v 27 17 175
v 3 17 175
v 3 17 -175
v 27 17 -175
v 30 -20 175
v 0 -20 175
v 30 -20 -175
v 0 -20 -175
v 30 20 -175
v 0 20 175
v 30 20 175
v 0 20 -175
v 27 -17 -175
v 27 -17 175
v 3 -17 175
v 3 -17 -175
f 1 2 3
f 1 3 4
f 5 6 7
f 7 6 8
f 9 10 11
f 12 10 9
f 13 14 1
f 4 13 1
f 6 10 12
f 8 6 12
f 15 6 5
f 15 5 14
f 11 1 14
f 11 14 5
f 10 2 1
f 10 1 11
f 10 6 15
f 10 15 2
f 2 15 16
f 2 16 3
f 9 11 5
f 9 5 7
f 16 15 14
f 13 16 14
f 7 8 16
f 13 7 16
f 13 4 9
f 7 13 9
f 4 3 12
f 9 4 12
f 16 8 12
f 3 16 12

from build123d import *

# Parameters (mm, degrees)
CROQUIS1_W              = 350
CROQUIS1_H              = 40
SALIENTE_EXTRUIR1_DEPTH = 30
CROQUIS2_W              = 24
CROQUIS2_H              = 34
CORTAR_EXTRUIR1_DEPTH   = 890


with BuildPart() as part:
    # Croquis1 → Saliente-Extruir1 (new body)
    with BuildSketch(Plane(origin=(0, 0, 0), x_dir=(0, 0, -1), z_dir=(1, 0, 0))):
        Rectangle(CROQUIS1_W, CROQUIS1_H)
    extrude(amount=SALIENTE_EXTRUIR1_DEPTH)

    # Croquis2 → Cortar-Extruir1 (cut)
    with BuildSketch(Plane.XY.offset(175)):
        with Locations((15, 0)):
            Rectangle(CROQUIS2_W, CROQUIS2_H)
    extrude(amount=-CORTAR_EXTRUIR1_DEPTH, mode=Mode.SUBTRACT)


solid = part.part
